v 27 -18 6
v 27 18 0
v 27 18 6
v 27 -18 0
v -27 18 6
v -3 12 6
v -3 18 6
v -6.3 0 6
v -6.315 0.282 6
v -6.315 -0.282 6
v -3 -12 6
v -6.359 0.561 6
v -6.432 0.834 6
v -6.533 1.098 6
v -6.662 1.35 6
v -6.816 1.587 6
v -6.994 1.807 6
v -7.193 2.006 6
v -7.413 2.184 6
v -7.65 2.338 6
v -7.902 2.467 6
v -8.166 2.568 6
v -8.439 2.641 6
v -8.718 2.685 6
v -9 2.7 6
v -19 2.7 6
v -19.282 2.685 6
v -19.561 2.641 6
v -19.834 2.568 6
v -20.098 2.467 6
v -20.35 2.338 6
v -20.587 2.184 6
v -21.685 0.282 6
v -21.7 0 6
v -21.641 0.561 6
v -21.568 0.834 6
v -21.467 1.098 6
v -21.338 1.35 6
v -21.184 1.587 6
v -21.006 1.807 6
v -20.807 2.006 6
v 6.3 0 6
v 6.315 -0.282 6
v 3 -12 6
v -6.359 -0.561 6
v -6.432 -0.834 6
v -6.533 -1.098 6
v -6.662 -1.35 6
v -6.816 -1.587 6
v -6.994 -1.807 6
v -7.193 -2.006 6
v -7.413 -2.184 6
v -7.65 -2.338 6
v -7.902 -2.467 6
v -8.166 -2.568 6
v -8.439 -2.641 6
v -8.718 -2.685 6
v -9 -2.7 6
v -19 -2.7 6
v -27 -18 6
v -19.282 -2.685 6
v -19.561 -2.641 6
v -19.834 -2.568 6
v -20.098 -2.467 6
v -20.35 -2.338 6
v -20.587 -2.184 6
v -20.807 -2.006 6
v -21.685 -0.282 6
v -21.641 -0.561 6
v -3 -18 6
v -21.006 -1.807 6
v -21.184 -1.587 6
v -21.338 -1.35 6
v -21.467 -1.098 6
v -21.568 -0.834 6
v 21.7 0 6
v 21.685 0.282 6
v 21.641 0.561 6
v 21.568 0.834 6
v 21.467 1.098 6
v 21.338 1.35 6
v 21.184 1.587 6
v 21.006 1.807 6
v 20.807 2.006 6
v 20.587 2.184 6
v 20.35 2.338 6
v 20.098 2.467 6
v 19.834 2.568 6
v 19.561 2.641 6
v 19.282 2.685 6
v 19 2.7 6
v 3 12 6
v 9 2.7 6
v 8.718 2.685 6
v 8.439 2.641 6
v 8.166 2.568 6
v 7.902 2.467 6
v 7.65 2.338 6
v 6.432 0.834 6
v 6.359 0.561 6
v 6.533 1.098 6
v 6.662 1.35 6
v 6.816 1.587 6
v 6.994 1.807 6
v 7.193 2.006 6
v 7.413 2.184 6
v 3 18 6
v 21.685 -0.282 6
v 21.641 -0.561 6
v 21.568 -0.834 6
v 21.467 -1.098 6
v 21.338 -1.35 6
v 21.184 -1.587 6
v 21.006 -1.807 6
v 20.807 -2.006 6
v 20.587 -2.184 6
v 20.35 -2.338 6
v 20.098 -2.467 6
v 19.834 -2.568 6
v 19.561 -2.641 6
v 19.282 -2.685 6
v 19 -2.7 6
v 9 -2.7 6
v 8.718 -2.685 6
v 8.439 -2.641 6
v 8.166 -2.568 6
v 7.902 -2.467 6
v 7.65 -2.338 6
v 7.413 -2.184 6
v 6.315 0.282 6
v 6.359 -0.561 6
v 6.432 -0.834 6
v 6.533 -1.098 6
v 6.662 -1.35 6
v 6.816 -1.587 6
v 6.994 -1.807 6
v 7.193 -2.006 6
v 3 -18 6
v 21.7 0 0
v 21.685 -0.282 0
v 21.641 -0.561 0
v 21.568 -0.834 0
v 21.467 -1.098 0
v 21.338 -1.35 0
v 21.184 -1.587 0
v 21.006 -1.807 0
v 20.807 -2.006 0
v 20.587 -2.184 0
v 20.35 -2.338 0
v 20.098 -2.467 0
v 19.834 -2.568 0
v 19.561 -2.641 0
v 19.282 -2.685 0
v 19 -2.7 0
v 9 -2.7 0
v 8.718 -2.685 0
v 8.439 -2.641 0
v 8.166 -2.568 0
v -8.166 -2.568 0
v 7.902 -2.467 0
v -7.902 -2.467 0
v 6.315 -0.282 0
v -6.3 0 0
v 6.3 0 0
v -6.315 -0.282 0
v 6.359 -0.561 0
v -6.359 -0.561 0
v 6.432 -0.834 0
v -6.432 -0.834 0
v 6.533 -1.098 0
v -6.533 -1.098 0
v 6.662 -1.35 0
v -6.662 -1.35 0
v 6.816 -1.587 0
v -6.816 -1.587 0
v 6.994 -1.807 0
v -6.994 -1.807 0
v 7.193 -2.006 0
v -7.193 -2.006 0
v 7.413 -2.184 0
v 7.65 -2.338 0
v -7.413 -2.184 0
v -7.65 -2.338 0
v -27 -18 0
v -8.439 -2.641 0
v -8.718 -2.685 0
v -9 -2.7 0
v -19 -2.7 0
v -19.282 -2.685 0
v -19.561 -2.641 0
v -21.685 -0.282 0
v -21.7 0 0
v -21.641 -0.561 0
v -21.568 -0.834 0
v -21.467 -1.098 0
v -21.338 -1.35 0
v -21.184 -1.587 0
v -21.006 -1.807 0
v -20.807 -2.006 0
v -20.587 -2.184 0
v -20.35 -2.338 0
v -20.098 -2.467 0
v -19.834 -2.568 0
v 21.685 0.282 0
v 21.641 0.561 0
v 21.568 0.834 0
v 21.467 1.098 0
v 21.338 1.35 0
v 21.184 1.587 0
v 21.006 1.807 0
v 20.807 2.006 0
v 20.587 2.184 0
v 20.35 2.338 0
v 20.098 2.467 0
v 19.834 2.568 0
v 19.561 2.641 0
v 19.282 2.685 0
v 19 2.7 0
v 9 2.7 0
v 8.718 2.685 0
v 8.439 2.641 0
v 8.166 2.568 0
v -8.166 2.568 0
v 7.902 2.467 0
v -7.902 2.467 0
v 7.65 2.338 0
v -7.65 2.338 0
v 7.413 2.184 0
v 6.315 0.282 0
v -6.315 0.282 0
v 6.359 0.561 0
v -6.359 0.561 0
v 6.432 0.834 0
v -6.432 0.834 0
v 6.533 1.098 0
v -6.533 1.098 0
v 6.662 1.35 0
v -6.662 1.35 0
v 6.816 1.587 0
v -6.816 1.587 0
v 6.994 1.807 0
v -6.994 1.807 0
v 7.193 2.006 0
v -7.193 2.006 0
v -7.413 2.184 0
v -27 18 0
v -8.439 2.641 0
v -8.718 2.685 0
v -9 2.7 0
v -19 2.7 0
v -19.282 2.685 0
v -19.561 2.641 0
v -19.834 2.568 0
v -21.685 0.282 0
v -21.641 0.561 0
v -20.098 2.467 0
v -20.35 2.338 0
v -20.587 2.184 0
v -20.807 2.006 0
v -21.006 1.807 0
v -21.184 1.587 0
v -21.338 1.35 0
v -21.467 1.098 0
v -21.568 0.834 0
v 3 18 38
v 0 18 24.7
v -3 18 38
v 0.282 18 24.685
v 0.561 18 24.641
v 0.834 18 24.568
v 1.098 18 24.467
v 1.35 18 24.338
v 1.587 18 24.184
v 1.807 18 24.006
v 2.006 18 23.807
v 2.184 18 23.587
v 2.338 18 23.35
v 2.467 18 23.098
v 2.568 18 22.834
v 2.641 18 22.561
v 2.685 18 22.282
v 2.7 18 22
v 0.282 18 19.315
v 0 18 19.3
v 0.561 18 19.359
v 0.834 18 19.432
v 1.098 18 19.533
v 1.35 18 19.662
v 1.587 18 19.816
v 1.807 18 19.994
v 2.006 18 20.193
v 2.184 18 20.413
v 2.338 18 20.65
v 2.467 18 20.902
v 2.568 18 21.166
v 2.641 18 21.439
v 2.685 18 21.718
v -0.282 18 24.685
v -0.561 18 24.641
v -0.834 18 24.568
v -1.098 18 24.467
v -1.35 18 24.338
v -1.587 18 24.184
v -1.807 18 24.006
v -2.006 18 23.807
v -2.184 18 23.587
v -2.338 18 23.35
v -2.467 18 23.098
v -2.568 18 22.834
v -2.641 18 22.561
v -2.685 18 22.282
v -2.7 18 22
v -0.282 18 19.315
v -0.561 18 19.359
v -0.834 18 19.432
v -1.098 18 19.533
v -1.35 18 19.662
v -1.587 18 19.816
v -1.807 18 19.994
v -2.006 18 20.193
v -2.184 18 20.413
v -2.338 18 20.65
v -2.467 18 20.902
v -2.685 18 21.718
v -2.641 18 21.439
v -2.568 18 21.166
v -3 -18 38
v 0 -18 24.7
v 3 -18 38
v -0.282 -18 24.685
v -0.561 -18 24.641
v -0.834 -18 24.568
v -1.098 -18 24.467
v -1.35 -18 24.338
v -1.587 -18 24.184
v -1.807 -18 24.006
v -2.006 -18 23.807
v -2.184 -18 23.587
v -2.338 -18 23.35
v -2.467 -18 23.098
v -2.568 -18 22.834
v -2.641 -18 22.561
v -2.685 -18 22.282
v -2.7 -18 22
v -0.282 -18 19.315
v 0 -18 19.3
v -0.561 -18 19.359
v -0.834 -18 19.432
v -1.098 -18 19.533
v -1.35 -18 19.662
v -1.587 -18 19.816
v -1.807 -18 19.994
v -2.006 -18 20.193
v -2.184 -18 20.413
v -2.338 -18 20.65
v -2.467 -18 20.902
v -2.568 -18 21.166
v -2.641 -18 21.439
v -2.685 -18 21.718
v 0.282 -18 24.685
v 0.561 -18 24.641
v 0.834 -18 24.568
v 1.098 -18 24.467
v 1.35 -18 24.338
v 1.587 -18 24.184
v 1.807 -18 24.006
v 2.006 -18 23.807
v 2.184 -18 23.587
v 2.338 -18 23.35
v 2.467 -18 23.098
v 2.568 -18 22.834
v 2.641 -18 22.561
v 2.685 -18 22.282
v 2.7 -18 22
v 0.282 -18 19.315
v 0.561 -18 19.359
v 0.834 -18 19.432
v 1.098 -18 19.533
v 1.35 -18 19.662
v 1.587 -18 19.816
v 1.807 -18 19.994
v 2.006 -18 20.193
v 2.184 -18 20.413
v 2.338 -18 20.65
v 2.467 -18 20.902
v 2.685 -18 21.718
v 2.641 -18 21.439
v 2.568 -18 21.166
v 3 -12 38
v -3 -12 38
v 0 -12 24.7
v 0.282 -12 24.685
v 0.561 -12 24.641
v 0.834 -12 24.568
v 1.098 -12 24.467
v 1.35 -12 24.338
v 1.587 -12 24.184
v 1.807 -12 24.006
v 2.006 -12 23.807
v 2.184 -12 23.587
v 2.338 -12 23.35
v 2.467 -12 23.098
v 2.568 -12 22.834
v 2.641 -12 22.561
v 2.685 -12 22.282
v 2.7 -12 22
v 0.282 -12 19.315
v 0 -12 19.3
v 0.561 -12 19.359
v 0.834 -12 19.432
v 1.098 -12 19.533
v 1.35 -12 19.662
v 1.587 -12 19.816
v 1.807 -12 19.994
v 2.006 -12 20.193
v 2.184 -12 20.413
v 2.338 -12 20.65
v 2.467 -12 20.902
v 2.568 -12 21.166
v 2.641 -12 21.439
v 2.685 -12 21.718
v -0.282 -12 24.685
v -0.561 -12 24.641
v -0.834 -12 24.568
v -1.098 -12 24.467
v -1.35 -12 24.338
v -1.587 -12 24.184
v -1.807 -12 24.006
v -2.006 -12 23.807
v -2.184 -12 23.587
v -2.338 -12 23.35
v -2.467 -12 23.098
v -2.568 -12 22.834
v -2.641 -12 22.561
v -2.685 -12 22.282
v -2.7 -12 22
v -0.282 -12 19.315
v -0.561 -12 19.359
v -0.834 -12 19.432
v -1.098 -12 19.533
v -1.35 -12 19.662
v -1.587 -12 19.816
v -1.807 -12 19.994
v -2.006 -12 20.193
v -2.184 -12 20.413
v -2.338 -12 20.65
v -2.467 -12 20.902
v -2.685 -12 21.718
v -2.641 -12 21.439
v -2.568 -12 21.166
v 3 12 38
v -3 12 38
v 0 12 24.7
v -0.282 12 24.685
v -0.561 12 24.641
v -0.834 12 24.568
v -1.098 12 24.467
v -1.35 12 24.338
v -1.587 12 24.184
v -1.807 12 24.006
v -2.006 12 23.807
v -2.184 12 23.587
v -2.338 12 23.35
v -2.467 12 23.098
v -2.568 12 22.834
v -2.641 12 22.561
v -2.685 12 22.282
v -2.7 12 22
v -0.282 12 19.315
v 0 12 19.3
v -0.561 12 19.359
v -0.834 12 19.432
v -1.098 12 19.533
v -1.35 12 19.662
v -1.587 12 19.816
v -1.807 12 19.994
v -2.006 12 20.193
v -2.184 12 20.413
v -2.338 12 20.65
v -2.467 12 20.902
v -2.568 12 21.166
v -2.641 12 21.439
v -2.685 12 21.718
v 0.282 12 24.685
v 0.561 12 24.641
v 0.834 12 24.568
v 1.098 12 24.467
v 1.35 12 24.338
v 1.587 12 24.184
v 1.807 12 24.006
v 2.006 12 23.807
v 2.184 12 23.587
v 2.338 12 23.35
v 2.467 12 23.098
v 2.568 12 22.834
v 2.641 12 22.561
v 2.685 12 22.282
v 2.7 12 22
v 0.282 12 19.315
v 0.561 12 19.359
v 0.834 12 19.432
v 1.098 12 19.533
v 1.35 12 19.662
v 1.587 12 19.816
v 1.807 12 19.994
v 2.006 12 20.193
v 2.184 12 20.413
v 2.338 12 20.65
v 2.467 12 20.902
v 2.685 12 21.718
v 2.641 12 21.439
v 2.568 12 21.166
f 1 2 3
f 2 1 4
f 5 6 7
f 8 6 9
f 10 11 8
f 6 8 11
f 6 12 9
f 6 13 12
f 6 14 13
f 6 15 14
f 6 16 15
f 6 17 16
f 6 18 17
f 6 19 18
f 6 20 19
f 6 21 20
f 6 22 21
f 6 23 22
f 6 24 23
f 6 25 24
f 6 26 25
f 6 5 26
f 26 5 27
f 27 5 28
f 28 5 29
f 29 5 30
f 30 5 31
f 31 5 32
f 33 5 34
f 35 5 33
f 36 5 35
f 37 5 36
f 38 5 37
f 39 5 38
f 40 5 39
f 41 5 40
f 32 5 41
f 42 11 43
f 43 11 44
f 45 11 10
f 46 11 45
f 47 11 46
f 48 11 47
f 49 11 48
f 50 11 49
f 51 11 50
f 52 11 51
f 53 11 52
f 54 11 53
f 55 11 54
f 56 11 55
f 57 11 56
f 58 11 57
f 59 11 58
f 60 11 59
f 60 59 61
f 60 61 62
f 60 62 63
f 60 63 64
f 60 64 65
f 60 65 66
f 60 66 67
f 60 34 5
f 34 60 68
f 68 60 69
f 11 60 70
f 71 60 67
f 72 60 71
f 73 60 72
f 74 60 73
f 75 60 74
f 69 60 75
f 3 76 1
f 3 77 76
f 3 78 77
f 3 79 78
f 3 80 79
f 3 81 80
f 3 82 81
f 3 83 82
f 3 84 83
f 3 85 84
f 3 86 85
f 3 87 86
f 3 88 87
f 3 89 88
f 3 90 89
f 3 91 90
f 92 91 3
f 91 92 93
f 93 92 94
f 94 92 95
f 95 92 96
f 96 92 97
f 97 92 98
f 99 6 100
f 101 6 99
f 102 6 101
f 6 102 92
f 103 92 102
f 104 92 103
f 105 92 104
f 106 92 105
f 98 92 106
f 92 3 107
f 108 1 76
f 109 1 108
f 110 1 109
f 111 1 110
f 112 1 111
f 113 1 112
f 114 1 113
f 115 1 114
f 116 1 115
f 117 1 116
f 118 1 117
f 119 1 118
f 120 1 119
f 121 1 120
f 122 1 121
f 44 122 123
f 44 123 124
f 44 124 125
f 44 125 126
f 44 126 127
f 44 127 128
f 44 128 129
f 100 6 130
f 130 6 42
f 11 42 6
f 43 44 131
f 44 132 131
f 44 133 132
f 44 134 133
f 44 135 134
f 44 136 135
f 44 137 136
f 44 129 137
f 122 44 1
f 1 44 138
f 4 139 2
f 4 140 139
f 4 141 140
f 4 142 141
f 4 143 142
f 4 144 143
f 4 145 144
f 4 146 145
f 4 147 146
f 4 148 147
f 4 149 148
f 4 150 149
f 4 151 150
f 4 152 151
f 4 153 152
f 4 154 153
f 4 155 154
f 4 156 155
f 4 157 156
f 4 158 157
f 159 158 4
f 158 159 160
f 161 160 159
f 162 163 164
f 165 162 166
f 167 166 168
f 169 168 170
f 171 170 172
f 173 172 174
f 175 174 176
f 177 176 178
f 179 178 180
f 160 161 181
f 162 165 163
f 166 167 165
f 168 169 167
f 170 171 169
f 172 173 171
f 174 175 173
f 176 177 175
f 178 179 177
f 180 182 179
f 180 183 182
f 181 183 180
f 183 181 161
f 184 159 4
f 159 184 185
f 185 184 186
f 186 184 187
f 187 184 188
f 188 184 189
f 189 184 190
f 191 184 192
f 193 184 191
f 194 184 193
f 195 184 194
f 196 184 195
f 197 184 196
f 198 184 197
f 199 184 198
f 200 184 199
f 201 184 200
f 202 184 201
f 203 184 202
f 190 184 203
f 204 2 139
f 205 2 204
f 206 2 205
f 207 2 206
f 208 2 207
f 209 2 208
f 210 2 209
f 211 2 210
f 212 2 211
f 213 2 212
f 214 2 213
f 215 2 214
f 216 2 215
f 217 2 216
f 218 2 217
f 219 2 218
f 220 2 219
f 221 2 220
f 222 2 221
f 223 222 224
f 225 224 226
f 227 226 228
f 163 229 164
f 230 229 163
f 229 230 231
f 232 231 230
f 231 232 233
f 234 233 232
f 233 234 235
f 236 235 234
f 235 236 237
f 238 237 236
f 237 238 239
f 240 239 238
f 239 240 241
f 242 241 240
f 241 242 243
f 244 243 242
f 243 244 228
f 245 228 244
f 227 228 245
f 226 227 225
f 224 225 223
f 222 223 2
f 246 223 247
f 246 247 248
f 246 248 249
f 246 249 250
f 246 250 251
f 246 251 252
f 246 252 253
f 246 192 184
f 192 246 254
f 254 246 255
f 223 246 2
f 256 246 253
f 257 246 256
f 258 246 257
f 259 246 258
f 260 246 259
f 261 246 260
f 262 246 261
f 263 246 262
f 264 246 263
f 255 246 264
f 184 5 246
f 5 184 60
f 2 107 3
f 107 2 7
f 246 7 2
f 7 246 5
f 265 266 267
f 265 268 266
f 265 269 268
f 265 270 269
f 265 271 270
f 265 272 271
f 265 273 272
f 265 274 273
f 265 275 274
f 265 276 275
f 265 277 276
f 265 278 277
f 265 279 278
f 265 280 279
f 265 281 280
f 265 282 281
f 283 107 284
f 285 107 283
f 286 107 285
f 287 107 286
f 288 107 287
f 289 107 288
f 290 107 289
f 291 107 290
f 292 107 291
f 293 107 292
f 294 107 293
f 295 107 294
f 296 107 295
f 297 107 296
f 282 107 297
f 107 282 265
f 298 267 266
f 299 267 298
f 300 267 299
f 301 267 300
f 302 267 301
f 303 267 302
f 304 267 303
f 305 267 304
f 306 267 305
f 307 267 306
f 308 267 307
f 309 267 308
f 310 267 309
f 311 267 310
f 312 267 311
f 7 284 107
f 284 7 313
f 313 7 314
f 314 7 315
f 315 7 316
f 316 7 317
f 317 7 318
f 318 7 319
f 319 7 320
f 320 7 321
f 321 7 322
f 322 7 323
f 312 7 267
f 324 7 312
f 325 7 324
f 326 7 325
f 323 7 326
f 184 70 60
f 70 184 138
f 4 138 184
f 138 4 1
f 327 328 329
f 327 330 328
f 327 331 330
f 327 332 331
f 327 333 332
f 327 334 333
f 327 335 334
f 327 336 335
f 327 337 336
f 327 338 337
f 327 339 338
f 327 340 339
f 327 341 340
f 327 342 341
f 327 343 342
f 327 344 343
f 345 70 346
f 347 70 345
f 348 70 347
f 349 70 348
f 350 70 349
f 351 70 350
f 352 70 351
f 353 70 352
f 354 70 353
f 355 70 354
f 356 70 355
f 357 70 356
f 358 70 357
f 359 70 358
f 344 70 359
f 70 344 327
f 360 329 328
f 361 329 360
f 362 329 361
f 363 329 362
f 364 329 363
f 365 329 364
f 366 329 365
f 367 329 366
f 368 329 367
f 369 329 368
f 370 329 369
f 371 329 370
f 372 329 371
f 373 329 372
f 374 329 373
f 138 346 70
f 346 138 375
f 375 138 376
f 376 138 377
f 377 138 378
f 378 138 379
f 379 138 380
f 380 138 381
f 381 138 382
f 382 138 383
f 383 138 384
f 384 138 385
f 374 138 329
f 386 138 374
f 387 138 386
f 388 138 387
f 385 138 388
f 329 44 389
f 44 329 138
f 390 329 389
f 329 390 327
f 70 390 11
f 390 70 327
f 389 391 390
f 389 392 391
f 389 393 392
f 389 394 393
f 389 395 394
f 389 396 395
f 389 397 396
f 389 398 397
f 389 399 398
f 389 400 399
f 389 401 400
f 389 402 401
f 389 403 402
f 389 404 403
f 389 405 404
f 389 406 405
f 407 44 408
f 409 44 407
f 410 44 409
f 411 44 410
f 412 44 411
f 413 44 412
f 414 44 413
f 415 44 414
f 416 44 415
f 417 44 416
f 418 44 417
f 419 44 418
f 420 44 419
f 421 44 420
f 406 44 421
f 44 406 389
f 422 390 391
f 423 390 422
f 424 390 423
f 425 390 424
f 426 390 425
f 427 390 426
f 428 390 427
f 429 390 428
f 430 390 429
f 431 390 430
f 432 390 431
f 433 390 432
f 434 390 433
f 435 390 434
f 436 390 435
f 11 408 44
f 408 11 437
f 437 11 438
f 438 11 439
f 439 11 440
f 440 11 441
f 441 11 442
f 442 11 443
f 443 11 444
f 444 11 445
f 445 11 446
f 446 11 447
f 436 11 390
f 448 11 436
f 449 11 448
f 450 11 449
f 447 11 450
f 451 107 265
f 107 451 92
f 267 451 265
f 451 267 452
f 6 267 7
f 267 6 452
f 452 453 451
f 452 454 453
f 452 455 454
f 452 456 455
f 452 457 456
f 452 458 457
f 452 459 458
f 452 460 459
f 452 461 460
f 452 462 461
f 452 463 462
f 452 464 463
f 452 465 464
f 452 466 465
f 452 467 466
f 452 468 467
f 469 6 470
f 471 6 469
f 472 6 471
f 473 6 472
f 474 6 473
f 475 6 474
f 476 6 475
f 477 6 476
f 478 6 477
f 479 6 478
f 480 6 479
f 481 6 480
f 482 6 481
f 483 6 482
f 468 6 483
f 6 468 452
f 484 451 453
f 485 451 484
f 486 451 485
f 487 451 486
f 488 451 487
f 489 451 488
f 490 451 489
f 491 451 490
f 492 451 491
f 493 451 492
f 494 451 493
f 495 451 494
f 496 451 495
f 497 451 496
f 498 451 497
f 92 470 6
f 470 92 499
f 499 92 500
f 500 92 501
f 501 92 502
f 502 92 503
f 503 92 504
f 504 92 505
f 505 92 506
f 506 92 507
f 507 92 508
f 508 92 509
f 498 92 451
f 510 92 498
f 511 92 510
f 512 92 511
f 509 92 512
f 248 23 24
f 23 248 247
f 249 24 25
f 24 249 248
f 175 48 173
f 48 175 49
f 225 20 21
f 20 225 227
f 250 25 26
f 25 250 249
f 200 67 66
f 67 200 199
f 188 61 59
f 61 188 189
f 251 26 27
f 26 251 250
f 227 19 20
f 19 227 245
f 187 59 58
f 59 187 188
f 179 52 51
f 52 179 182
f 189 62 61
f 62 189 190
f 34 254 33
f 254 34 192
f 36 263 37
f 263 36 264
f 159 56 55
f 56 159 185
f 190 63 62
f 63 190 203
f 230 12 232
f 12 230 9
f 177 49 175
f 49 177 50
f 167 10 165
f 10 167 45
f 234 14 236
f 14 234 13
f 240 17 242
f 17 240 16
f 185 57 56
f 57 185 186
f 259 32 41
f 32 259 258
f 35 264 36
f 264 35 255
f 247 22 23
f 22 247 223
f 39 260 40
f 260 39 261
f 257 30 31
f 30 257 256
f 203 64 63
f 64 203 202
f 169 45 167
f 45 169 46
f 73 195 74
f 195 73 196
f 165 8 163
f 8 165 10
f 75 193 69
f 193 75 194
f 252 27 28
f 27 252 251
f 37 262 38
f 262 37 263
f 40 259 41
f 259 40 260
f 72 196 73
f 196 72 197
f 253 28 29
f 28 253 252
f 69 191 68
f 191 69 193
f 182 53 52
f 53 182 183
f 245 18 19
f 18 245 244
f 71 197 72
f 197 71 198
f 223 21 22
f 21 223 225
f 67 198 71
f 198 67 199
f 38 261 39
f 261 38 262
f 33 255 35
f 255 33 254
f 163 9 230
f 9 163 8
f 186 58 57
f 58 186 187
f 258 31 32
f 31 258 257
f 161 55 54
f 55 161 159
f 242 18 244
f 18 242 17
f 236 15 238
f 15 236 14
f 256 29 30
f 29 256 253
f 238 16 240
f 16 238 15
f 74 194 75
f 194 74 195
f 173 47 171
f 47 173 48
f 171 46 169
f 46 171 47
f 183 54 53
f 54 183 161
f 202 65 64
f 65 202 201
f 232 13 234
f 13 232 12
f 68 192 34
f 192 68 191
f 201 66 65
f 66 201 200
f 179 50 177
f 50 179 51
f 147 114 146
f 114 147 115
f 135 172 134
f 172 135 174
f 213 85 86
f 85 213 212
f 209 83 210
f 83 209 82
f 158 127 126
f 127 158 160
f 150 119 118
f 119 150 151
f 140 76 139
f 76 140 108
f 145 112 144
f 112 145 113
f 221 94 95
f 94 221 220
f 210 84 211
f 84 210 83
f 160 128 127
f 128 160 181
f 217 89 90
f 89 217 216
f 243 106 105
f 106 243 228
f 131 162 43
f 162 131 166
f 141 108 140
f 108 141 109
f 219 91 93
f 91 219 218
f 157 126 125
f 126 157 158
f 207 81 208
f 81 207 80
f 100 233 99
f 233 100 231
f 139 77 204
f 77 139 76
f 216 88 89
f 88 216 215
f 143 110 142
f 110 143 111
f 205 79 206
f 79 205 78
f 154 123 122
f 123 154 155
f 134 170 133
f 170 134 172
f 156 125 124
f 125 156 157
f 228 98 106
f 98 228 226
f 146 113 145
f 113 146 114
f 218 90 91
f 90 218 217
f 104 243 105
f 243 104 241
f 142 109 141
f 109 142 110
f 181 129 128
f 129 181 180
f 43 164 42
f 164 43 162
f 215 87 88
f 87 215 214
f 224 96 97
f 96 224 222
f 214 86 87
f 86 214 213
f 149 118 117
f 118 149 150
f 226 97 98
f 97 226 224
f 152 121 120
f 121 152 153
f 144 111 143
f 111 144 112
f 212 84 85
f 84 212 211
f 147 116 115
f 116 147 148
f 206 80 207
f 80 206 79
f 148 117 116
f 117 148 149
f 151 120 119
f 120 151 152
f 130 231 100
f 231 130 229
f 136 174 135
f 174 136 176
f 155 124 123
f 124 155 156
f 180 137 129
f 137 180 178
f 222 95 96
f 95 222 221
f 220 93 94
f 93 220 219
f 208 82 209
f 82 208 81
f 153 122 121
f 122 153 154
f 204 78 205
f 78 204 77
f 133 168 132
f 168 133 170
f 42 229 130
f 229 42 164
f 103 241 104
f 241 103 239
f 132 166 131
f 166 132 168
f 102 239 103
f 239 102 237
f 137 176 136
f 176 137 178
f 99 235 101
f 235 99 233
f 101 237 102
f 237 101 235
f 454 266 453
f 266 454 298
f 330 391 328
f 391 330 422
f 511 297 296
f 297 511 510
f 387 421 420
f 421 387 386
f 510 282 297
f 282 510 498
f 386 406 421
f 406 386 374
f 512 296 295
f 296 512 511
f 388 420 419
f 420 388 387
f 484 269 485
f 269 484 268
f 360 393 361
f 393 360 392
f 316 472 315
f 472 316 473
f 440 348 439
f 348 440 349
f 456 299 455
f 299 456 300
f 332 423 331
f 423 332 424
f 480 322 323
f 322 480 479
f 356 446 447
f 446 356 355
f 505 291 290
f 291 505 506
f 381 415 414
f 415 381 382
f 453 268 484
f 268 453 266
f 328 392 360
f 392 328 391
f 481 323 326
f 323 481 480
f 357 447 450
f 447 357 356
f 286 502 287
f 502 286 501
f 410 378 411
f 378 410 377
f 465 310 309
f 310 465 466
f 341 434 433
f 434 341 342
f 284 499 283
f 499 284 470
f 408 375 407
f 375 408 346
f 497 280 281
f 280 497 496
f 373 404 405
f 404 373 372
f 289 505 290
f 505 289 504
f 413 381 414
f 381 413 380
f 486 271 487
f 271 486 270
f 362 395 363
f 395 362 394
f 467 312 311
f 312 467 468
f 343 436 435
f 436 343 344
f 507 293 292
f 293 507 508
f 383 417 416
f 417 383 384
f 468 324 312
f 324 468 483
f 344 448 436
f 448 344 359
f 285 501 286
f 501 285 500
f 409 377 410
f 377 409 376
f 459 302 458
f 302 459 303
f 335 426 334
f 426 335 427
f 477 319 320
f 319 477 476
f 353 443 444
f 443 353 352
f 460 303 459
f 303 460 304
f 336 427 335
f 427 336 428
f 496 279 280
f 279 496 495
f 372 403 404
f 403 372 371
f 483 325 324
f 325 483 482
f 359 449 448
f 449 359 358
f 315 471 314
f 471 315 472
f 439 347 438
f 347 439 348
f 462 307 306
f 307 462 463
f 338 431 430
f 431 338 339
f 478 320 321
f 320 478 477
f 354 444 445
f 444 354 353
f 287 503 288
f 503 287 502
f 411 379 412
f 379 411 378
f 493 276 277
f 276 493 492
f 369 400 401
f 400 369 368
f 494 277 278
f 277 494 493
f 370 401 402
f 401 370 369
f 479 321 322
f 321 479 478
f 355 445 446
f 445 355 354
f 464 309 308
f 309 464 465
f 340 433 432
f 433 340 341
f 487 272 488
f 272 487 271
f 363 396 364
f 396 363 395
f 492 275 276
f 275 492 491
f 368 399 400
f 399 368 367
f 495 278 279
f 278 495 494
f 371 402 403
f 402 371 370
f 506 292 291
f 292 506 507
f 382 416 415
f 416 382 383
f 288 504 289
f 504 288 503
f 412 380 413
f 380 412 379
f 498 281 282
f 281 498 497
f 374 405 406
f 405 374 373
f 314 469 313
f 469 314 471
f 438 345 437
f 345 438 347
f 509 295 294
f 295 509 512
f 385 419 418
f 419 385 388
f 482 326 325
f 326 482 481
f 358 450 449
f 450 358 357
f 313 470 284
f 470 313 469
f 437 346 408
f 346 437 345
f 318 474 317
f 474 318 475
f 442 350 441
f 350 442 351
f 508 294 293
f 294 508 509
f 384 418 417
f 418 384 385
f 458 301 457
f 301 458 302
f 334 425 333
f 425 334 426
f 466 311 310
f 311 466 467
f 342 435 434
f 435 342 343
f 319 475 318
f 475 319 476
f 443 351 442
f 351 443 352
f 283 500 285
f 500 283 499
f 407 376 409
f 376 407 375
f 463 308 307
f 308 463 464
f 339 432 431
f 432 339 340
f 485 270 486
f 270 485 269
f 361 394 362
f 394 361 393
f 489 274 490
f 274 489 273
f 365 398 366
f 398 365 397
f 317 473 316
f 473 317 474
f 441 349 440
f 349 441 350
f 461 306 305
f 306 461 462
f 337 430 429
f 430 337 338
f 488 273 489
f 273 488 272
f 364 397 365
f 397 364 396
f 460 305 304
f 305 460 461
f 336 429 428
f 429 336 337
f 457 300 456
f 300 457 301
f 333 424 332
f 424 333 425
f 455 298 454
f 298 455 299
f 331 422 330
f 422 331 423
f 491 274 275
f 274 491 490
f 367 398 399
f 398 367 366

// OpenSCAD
// M5 U pivot bracket: rigid U bracket with two 6 mm ears for an M5 pivot.
$fn = 60;
eps = 0.02;
base_l = 54;
base_w = 36;
base_t = 6;
ear_t = 6;
ear_h = 34;
pivot_d = 5.4;
mount_d = 5.4;

module mount_slot(x) {
    hull() {
        translate([x - 5, 0, -eps]) cylinder(d = mount_d, h = base_t + 2 * eps);
        translate([x + 5, 0, -eps]) cylinder(d = mount_d, h = base_t + 2 * eps);
    }
}

difference() {
    union() {
        translate([-base_l / 2, -base_w / 2, 0]) cube([base_l, base_w, base_t]);
        translate([-ear_t / 2, -base_w / 2, base_t - 2]) cube([ear_t, ear_t, ear_h]);
        translate([-ear_t / 2, base_w / 2 - ear_t, base_t - 2]) cube([ear_t, ear_t, ear_h]);
    }
    mount_slot(-14);
    mount_slot(14);
    translate([0, -base_w / 2 - eps, 22]) rotate([-90, 0, 0]) cylinder(d = pivot_d, h = base_w + 2 * eps);
}
